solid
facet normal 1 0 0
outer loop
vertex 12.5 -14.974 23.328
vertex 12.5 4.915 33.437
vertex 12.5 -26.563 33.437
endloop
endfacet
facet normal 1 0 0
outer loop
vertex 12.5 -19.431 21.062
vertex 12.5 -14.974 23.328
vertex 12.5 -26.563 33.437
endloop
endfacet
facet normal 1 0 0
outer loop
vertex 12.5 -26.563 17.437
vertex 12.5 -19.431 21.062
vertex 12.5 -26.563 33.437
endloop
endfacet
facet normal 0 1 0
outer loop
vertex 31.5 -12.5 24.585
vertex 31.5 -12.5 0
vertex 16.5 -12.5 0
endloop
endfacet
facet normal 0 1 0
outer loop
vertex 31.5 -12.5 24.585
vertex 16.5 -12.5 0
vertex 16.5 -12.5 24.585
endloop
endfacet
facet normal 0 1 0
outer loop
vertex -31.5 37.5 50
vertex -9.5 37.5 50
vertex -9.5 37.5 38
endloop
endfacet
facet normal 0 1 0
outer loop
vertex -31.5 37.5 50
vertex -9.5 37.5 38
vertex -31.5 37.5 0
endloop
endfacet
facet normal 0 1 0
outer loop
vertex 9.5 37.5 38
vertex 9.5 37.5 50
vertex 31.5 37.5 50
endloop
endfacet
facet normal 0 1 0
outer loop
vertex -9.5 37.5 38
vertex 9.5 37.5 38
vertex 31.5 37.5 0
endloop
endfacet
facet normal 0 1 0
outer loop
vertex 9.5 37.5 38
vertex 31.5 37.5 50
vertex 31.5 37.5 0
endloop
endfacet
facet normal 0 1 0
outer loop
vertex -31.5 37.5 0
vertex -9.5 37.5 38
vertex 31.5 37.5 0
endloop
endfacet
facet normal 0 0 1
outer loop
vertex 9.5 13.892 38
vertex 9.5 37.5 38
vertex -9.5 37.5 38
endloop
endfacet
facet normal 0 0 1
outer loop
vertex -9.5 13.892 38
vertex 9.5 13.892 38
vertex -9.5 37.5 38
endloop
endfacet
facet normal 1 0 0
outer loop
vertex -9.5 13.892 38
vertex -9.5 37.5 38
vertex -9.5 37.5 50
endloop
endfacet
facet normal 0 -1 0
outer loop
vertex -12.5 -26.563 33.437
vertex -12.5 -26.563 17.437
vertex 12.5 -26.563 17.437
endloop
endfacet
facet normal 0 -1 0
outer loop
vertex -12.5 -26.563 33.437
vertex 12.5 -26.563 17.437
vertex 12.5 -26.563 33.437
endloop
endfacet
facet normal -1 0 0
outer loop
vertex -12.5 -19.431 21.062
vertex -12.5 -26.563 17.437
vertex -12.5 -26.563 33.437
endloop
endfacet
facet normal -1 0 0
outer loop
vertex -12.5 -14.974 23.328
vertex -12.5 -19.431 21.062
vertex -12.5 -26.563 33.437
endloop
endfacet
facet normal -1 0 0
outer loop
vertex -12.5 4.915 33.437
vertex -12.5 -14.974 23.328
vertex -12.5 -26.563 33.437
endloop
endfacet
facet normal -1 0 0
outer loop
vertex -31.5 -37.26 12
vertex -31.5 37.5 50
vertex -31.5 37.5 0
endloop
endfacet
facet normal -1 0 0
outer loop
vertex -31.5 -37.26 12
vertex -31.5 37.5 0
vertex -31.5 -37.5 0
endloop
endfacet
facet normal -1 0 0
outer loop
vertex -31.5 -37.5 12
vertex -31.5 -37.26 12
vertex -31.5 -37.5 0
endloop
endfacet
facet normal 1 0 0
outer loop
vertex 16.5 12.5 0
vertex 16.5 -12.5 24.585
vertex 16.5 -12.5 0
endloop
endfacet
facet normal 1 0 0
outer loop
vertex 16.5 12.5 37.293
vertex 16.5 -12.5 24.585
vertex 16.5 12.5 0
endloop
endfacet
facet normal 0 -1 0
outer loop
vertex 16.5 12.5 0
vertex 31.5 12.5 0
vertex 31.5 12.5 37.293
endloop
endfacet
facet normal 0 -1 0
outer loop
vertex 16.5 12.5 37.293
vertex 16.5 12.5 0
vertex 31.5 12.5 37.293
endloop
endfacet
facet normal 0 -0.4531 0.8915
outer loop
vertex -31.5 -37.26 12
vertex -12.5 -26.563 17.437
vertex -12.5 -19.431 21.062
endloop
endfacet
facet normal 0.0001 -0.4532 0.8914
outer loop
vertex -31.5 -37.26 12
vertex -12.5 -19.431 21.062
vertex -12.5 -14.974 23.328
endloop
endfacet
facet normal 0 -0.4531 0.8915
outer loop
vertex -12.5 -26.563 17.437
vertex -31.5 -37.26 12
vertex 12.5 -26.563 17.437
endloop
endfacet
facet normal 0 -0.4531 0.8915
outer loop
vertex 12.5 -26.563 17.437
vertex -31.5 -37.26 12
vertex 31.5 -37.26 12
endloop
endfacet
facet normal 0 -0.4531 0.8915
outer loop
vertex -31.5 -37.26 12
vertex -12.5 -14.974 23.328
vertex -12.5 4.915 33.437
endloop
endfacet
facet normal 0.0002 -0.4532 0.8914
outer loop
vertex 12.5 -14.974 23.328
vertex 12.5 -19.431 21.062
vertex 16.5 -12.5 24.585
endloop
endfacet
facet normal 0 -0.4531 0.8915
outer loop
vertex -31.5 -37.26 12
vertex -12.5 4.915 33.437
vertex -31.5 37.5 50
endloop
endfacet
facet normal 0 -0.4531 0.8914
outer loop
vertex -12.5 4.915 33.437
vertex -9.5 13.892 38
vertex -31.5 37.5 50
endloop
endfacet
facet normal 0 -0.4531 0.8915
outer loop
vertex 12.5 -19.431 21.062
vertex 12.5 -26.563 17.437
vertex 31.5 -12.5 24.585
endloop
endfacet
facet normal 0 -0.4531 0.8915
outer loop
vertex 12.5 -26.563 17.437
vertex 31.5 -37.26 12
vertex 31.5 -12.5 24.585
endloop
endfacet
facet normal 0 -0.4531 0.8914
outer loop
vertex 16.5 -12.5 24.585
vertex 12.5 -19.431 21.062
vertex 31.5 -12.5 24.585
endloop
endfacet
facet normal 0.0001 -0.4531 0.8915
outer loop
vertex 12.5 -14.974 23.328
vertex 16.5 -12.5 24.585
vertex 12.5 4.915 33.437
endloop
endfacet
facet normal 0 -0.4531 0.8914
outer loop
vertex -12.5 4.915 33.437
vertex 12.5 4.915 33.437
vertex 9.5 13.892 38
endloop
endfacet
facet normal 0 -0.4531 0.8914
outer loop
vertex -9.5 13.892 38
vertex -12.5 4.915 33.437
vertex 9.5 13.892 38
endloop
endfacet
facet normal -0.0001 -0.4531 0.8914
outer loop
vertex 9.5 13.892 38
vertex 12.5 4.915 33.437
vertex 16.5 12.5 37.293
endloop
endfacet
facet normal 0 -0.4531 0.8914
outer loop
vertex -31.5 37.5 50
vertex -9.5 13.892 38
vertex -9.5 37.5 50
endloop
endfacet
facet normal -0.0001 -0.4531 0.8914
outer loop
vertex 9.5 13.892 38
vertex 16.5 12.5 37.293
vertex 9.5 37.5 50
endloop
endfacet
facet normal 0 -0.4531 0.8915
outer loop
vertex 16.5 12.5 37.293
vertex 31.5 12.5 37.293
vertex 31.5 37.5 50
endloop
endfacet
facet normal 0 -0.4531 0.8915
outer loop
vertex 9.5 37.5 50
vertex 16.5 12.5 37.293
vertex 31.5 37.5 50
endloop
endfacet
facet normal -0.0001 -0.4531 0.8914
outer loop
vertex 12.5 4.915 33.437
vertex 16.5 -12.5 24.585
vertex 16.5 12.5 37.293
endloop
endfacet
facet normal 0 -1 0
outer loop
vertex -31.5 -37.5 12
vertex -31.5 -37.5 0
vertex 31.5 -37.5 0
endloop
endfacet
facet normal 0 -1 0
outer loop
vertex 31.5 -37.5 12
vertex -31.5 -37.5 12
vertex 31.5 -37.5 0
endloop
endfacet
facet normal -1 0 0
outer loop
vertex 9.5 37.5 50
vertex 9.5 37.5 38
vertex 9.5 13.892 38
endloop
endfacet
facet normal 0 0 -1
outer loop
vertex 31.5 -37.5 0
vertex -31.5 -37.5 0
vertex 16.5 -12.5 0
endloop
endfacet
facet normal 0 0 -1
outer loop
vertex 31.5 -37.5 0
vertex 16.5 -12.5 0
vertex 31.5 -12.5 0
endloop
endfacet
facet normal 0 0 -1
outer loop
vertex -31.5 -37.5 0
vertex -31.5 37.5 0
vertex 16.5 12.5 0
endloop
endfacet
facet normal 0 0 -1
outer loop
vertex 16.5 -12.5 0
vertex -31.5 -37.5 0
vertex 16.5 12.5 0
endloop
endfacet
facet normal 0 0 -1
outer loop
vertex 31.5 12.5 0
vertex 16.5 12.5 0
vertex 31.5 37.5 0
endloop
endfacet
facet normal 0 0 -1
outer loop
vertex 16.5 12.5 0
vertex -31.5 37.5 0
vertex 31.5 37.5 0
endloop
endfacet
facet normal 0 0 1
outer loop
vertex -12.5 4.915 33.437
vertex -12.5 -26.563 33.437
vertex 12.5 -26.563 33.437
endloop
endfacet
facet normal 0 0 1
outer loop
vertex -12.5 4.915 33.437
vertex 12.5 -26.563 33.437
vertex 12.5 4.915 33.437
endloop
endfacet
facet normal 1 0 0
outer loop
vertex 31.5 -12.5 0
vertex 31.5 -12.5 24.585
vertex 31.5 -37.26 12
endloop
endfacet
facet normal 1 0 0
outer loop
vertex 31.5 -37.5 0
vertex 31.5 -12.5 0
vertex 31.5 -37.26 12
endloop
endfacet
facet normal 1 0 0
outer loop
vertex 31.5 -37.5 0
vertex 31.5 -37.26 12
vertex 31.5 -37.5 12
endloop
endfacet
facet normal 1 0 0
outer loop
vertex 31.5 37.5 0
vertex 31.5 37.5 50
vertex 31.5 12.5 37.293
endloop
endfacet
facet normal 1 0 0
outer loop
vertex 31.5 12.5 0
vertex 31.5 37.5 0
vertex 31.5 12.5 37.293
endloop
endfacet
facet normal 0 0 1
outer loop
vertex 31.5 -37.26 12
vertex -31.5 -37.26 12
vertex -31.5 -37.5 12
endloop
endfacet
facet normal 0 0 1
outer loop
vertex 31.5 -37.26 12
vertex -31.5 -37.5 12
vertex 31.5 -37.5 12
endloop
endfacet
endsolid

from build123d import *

# Parameters (mm, degrees)
SKETCH_W        = 63
SKETCH_H        = 75
PAD_DEPTH       = 12
PAD001_DEPTH    = 63
SKETCH002_W     = 19
SKETCH002_H     = 22.106678
POCKET_DEPTH    = 75.001
SKETCH003_W     = 25
SKETCH003_H     = 65.320022
POCKET001_DEPTH = 15
SKETCH004_W     = 25
SKETCH004_H     = 5
PAD002_DEPTH    = 1
PAD003_DEPTH    = 25


with BuildPart() as part:
    # Sketch → Pad (new body)
    with BuildSketch(Plane.XY):
        Rectangle(SKETCH_W, SKETCH_H)
    extrude(amount=PAD_DEPTH)

    # Sketch001 → Pad001 (new body)
    with BuildSketch(Plane.YZ.offset(31.5)):
        Polygon((-37.260017, 12), (37.5, 50), (37.5, 12), align=None)
    extrude(amount=-PAD001_DEPTH)

    # Sketch002 → Pocket (cut, through all)
    with BuildSketch(Plane(origin=(0, 37.5, 0), x_dir=(-1, 0, 0), z_dir=(0, 1, 0))):
        with Locations((0, 49.053339)):
            Rectangle(SKETCH002_W, SKETCH002_H)
    extrude(amount=-POCKET_DEPTH, mode=Mode.SUBTRACT)

    # Sketch003 → Pocket001 (cut)
    with BuildSketch(Plane.YZ.offset(31.5)):
        with Locations((0, 22.23333)):
            Rectangle(SKETCH003_W, SKETCH003_H)
    extrude(amount=-POCKET001_DEPTH, mode=Mode.SUBTRACT)

    # Sketch004 → Pad002 (new body)
    with BuildSketch(Plane(origin=(0, -12.497267, 24.586735), x_dir=(1, 0, 0), z_dir=(0, -0.453118, 0.89145))):
        with Locations((0, -5.278043)):
            Rectangle(SKETCH004_W, SKETCH004_H)
    extrude(amount=PAD002_DEPTH)

    # Sketch005 → Pad003 (new body)
    with BuildSketch(Plane(origin=(-12.5, 0, 0), x_dir=(0, -1, 0), z_dir=(-1, 0, 0))):
        Polygon((-4.915291, 33.437417), (26.562611, 17.437417), (26.562611, 33.437417), align=None)
    extrude(amount=-PAD003_DEPTH)


solid = part.part
